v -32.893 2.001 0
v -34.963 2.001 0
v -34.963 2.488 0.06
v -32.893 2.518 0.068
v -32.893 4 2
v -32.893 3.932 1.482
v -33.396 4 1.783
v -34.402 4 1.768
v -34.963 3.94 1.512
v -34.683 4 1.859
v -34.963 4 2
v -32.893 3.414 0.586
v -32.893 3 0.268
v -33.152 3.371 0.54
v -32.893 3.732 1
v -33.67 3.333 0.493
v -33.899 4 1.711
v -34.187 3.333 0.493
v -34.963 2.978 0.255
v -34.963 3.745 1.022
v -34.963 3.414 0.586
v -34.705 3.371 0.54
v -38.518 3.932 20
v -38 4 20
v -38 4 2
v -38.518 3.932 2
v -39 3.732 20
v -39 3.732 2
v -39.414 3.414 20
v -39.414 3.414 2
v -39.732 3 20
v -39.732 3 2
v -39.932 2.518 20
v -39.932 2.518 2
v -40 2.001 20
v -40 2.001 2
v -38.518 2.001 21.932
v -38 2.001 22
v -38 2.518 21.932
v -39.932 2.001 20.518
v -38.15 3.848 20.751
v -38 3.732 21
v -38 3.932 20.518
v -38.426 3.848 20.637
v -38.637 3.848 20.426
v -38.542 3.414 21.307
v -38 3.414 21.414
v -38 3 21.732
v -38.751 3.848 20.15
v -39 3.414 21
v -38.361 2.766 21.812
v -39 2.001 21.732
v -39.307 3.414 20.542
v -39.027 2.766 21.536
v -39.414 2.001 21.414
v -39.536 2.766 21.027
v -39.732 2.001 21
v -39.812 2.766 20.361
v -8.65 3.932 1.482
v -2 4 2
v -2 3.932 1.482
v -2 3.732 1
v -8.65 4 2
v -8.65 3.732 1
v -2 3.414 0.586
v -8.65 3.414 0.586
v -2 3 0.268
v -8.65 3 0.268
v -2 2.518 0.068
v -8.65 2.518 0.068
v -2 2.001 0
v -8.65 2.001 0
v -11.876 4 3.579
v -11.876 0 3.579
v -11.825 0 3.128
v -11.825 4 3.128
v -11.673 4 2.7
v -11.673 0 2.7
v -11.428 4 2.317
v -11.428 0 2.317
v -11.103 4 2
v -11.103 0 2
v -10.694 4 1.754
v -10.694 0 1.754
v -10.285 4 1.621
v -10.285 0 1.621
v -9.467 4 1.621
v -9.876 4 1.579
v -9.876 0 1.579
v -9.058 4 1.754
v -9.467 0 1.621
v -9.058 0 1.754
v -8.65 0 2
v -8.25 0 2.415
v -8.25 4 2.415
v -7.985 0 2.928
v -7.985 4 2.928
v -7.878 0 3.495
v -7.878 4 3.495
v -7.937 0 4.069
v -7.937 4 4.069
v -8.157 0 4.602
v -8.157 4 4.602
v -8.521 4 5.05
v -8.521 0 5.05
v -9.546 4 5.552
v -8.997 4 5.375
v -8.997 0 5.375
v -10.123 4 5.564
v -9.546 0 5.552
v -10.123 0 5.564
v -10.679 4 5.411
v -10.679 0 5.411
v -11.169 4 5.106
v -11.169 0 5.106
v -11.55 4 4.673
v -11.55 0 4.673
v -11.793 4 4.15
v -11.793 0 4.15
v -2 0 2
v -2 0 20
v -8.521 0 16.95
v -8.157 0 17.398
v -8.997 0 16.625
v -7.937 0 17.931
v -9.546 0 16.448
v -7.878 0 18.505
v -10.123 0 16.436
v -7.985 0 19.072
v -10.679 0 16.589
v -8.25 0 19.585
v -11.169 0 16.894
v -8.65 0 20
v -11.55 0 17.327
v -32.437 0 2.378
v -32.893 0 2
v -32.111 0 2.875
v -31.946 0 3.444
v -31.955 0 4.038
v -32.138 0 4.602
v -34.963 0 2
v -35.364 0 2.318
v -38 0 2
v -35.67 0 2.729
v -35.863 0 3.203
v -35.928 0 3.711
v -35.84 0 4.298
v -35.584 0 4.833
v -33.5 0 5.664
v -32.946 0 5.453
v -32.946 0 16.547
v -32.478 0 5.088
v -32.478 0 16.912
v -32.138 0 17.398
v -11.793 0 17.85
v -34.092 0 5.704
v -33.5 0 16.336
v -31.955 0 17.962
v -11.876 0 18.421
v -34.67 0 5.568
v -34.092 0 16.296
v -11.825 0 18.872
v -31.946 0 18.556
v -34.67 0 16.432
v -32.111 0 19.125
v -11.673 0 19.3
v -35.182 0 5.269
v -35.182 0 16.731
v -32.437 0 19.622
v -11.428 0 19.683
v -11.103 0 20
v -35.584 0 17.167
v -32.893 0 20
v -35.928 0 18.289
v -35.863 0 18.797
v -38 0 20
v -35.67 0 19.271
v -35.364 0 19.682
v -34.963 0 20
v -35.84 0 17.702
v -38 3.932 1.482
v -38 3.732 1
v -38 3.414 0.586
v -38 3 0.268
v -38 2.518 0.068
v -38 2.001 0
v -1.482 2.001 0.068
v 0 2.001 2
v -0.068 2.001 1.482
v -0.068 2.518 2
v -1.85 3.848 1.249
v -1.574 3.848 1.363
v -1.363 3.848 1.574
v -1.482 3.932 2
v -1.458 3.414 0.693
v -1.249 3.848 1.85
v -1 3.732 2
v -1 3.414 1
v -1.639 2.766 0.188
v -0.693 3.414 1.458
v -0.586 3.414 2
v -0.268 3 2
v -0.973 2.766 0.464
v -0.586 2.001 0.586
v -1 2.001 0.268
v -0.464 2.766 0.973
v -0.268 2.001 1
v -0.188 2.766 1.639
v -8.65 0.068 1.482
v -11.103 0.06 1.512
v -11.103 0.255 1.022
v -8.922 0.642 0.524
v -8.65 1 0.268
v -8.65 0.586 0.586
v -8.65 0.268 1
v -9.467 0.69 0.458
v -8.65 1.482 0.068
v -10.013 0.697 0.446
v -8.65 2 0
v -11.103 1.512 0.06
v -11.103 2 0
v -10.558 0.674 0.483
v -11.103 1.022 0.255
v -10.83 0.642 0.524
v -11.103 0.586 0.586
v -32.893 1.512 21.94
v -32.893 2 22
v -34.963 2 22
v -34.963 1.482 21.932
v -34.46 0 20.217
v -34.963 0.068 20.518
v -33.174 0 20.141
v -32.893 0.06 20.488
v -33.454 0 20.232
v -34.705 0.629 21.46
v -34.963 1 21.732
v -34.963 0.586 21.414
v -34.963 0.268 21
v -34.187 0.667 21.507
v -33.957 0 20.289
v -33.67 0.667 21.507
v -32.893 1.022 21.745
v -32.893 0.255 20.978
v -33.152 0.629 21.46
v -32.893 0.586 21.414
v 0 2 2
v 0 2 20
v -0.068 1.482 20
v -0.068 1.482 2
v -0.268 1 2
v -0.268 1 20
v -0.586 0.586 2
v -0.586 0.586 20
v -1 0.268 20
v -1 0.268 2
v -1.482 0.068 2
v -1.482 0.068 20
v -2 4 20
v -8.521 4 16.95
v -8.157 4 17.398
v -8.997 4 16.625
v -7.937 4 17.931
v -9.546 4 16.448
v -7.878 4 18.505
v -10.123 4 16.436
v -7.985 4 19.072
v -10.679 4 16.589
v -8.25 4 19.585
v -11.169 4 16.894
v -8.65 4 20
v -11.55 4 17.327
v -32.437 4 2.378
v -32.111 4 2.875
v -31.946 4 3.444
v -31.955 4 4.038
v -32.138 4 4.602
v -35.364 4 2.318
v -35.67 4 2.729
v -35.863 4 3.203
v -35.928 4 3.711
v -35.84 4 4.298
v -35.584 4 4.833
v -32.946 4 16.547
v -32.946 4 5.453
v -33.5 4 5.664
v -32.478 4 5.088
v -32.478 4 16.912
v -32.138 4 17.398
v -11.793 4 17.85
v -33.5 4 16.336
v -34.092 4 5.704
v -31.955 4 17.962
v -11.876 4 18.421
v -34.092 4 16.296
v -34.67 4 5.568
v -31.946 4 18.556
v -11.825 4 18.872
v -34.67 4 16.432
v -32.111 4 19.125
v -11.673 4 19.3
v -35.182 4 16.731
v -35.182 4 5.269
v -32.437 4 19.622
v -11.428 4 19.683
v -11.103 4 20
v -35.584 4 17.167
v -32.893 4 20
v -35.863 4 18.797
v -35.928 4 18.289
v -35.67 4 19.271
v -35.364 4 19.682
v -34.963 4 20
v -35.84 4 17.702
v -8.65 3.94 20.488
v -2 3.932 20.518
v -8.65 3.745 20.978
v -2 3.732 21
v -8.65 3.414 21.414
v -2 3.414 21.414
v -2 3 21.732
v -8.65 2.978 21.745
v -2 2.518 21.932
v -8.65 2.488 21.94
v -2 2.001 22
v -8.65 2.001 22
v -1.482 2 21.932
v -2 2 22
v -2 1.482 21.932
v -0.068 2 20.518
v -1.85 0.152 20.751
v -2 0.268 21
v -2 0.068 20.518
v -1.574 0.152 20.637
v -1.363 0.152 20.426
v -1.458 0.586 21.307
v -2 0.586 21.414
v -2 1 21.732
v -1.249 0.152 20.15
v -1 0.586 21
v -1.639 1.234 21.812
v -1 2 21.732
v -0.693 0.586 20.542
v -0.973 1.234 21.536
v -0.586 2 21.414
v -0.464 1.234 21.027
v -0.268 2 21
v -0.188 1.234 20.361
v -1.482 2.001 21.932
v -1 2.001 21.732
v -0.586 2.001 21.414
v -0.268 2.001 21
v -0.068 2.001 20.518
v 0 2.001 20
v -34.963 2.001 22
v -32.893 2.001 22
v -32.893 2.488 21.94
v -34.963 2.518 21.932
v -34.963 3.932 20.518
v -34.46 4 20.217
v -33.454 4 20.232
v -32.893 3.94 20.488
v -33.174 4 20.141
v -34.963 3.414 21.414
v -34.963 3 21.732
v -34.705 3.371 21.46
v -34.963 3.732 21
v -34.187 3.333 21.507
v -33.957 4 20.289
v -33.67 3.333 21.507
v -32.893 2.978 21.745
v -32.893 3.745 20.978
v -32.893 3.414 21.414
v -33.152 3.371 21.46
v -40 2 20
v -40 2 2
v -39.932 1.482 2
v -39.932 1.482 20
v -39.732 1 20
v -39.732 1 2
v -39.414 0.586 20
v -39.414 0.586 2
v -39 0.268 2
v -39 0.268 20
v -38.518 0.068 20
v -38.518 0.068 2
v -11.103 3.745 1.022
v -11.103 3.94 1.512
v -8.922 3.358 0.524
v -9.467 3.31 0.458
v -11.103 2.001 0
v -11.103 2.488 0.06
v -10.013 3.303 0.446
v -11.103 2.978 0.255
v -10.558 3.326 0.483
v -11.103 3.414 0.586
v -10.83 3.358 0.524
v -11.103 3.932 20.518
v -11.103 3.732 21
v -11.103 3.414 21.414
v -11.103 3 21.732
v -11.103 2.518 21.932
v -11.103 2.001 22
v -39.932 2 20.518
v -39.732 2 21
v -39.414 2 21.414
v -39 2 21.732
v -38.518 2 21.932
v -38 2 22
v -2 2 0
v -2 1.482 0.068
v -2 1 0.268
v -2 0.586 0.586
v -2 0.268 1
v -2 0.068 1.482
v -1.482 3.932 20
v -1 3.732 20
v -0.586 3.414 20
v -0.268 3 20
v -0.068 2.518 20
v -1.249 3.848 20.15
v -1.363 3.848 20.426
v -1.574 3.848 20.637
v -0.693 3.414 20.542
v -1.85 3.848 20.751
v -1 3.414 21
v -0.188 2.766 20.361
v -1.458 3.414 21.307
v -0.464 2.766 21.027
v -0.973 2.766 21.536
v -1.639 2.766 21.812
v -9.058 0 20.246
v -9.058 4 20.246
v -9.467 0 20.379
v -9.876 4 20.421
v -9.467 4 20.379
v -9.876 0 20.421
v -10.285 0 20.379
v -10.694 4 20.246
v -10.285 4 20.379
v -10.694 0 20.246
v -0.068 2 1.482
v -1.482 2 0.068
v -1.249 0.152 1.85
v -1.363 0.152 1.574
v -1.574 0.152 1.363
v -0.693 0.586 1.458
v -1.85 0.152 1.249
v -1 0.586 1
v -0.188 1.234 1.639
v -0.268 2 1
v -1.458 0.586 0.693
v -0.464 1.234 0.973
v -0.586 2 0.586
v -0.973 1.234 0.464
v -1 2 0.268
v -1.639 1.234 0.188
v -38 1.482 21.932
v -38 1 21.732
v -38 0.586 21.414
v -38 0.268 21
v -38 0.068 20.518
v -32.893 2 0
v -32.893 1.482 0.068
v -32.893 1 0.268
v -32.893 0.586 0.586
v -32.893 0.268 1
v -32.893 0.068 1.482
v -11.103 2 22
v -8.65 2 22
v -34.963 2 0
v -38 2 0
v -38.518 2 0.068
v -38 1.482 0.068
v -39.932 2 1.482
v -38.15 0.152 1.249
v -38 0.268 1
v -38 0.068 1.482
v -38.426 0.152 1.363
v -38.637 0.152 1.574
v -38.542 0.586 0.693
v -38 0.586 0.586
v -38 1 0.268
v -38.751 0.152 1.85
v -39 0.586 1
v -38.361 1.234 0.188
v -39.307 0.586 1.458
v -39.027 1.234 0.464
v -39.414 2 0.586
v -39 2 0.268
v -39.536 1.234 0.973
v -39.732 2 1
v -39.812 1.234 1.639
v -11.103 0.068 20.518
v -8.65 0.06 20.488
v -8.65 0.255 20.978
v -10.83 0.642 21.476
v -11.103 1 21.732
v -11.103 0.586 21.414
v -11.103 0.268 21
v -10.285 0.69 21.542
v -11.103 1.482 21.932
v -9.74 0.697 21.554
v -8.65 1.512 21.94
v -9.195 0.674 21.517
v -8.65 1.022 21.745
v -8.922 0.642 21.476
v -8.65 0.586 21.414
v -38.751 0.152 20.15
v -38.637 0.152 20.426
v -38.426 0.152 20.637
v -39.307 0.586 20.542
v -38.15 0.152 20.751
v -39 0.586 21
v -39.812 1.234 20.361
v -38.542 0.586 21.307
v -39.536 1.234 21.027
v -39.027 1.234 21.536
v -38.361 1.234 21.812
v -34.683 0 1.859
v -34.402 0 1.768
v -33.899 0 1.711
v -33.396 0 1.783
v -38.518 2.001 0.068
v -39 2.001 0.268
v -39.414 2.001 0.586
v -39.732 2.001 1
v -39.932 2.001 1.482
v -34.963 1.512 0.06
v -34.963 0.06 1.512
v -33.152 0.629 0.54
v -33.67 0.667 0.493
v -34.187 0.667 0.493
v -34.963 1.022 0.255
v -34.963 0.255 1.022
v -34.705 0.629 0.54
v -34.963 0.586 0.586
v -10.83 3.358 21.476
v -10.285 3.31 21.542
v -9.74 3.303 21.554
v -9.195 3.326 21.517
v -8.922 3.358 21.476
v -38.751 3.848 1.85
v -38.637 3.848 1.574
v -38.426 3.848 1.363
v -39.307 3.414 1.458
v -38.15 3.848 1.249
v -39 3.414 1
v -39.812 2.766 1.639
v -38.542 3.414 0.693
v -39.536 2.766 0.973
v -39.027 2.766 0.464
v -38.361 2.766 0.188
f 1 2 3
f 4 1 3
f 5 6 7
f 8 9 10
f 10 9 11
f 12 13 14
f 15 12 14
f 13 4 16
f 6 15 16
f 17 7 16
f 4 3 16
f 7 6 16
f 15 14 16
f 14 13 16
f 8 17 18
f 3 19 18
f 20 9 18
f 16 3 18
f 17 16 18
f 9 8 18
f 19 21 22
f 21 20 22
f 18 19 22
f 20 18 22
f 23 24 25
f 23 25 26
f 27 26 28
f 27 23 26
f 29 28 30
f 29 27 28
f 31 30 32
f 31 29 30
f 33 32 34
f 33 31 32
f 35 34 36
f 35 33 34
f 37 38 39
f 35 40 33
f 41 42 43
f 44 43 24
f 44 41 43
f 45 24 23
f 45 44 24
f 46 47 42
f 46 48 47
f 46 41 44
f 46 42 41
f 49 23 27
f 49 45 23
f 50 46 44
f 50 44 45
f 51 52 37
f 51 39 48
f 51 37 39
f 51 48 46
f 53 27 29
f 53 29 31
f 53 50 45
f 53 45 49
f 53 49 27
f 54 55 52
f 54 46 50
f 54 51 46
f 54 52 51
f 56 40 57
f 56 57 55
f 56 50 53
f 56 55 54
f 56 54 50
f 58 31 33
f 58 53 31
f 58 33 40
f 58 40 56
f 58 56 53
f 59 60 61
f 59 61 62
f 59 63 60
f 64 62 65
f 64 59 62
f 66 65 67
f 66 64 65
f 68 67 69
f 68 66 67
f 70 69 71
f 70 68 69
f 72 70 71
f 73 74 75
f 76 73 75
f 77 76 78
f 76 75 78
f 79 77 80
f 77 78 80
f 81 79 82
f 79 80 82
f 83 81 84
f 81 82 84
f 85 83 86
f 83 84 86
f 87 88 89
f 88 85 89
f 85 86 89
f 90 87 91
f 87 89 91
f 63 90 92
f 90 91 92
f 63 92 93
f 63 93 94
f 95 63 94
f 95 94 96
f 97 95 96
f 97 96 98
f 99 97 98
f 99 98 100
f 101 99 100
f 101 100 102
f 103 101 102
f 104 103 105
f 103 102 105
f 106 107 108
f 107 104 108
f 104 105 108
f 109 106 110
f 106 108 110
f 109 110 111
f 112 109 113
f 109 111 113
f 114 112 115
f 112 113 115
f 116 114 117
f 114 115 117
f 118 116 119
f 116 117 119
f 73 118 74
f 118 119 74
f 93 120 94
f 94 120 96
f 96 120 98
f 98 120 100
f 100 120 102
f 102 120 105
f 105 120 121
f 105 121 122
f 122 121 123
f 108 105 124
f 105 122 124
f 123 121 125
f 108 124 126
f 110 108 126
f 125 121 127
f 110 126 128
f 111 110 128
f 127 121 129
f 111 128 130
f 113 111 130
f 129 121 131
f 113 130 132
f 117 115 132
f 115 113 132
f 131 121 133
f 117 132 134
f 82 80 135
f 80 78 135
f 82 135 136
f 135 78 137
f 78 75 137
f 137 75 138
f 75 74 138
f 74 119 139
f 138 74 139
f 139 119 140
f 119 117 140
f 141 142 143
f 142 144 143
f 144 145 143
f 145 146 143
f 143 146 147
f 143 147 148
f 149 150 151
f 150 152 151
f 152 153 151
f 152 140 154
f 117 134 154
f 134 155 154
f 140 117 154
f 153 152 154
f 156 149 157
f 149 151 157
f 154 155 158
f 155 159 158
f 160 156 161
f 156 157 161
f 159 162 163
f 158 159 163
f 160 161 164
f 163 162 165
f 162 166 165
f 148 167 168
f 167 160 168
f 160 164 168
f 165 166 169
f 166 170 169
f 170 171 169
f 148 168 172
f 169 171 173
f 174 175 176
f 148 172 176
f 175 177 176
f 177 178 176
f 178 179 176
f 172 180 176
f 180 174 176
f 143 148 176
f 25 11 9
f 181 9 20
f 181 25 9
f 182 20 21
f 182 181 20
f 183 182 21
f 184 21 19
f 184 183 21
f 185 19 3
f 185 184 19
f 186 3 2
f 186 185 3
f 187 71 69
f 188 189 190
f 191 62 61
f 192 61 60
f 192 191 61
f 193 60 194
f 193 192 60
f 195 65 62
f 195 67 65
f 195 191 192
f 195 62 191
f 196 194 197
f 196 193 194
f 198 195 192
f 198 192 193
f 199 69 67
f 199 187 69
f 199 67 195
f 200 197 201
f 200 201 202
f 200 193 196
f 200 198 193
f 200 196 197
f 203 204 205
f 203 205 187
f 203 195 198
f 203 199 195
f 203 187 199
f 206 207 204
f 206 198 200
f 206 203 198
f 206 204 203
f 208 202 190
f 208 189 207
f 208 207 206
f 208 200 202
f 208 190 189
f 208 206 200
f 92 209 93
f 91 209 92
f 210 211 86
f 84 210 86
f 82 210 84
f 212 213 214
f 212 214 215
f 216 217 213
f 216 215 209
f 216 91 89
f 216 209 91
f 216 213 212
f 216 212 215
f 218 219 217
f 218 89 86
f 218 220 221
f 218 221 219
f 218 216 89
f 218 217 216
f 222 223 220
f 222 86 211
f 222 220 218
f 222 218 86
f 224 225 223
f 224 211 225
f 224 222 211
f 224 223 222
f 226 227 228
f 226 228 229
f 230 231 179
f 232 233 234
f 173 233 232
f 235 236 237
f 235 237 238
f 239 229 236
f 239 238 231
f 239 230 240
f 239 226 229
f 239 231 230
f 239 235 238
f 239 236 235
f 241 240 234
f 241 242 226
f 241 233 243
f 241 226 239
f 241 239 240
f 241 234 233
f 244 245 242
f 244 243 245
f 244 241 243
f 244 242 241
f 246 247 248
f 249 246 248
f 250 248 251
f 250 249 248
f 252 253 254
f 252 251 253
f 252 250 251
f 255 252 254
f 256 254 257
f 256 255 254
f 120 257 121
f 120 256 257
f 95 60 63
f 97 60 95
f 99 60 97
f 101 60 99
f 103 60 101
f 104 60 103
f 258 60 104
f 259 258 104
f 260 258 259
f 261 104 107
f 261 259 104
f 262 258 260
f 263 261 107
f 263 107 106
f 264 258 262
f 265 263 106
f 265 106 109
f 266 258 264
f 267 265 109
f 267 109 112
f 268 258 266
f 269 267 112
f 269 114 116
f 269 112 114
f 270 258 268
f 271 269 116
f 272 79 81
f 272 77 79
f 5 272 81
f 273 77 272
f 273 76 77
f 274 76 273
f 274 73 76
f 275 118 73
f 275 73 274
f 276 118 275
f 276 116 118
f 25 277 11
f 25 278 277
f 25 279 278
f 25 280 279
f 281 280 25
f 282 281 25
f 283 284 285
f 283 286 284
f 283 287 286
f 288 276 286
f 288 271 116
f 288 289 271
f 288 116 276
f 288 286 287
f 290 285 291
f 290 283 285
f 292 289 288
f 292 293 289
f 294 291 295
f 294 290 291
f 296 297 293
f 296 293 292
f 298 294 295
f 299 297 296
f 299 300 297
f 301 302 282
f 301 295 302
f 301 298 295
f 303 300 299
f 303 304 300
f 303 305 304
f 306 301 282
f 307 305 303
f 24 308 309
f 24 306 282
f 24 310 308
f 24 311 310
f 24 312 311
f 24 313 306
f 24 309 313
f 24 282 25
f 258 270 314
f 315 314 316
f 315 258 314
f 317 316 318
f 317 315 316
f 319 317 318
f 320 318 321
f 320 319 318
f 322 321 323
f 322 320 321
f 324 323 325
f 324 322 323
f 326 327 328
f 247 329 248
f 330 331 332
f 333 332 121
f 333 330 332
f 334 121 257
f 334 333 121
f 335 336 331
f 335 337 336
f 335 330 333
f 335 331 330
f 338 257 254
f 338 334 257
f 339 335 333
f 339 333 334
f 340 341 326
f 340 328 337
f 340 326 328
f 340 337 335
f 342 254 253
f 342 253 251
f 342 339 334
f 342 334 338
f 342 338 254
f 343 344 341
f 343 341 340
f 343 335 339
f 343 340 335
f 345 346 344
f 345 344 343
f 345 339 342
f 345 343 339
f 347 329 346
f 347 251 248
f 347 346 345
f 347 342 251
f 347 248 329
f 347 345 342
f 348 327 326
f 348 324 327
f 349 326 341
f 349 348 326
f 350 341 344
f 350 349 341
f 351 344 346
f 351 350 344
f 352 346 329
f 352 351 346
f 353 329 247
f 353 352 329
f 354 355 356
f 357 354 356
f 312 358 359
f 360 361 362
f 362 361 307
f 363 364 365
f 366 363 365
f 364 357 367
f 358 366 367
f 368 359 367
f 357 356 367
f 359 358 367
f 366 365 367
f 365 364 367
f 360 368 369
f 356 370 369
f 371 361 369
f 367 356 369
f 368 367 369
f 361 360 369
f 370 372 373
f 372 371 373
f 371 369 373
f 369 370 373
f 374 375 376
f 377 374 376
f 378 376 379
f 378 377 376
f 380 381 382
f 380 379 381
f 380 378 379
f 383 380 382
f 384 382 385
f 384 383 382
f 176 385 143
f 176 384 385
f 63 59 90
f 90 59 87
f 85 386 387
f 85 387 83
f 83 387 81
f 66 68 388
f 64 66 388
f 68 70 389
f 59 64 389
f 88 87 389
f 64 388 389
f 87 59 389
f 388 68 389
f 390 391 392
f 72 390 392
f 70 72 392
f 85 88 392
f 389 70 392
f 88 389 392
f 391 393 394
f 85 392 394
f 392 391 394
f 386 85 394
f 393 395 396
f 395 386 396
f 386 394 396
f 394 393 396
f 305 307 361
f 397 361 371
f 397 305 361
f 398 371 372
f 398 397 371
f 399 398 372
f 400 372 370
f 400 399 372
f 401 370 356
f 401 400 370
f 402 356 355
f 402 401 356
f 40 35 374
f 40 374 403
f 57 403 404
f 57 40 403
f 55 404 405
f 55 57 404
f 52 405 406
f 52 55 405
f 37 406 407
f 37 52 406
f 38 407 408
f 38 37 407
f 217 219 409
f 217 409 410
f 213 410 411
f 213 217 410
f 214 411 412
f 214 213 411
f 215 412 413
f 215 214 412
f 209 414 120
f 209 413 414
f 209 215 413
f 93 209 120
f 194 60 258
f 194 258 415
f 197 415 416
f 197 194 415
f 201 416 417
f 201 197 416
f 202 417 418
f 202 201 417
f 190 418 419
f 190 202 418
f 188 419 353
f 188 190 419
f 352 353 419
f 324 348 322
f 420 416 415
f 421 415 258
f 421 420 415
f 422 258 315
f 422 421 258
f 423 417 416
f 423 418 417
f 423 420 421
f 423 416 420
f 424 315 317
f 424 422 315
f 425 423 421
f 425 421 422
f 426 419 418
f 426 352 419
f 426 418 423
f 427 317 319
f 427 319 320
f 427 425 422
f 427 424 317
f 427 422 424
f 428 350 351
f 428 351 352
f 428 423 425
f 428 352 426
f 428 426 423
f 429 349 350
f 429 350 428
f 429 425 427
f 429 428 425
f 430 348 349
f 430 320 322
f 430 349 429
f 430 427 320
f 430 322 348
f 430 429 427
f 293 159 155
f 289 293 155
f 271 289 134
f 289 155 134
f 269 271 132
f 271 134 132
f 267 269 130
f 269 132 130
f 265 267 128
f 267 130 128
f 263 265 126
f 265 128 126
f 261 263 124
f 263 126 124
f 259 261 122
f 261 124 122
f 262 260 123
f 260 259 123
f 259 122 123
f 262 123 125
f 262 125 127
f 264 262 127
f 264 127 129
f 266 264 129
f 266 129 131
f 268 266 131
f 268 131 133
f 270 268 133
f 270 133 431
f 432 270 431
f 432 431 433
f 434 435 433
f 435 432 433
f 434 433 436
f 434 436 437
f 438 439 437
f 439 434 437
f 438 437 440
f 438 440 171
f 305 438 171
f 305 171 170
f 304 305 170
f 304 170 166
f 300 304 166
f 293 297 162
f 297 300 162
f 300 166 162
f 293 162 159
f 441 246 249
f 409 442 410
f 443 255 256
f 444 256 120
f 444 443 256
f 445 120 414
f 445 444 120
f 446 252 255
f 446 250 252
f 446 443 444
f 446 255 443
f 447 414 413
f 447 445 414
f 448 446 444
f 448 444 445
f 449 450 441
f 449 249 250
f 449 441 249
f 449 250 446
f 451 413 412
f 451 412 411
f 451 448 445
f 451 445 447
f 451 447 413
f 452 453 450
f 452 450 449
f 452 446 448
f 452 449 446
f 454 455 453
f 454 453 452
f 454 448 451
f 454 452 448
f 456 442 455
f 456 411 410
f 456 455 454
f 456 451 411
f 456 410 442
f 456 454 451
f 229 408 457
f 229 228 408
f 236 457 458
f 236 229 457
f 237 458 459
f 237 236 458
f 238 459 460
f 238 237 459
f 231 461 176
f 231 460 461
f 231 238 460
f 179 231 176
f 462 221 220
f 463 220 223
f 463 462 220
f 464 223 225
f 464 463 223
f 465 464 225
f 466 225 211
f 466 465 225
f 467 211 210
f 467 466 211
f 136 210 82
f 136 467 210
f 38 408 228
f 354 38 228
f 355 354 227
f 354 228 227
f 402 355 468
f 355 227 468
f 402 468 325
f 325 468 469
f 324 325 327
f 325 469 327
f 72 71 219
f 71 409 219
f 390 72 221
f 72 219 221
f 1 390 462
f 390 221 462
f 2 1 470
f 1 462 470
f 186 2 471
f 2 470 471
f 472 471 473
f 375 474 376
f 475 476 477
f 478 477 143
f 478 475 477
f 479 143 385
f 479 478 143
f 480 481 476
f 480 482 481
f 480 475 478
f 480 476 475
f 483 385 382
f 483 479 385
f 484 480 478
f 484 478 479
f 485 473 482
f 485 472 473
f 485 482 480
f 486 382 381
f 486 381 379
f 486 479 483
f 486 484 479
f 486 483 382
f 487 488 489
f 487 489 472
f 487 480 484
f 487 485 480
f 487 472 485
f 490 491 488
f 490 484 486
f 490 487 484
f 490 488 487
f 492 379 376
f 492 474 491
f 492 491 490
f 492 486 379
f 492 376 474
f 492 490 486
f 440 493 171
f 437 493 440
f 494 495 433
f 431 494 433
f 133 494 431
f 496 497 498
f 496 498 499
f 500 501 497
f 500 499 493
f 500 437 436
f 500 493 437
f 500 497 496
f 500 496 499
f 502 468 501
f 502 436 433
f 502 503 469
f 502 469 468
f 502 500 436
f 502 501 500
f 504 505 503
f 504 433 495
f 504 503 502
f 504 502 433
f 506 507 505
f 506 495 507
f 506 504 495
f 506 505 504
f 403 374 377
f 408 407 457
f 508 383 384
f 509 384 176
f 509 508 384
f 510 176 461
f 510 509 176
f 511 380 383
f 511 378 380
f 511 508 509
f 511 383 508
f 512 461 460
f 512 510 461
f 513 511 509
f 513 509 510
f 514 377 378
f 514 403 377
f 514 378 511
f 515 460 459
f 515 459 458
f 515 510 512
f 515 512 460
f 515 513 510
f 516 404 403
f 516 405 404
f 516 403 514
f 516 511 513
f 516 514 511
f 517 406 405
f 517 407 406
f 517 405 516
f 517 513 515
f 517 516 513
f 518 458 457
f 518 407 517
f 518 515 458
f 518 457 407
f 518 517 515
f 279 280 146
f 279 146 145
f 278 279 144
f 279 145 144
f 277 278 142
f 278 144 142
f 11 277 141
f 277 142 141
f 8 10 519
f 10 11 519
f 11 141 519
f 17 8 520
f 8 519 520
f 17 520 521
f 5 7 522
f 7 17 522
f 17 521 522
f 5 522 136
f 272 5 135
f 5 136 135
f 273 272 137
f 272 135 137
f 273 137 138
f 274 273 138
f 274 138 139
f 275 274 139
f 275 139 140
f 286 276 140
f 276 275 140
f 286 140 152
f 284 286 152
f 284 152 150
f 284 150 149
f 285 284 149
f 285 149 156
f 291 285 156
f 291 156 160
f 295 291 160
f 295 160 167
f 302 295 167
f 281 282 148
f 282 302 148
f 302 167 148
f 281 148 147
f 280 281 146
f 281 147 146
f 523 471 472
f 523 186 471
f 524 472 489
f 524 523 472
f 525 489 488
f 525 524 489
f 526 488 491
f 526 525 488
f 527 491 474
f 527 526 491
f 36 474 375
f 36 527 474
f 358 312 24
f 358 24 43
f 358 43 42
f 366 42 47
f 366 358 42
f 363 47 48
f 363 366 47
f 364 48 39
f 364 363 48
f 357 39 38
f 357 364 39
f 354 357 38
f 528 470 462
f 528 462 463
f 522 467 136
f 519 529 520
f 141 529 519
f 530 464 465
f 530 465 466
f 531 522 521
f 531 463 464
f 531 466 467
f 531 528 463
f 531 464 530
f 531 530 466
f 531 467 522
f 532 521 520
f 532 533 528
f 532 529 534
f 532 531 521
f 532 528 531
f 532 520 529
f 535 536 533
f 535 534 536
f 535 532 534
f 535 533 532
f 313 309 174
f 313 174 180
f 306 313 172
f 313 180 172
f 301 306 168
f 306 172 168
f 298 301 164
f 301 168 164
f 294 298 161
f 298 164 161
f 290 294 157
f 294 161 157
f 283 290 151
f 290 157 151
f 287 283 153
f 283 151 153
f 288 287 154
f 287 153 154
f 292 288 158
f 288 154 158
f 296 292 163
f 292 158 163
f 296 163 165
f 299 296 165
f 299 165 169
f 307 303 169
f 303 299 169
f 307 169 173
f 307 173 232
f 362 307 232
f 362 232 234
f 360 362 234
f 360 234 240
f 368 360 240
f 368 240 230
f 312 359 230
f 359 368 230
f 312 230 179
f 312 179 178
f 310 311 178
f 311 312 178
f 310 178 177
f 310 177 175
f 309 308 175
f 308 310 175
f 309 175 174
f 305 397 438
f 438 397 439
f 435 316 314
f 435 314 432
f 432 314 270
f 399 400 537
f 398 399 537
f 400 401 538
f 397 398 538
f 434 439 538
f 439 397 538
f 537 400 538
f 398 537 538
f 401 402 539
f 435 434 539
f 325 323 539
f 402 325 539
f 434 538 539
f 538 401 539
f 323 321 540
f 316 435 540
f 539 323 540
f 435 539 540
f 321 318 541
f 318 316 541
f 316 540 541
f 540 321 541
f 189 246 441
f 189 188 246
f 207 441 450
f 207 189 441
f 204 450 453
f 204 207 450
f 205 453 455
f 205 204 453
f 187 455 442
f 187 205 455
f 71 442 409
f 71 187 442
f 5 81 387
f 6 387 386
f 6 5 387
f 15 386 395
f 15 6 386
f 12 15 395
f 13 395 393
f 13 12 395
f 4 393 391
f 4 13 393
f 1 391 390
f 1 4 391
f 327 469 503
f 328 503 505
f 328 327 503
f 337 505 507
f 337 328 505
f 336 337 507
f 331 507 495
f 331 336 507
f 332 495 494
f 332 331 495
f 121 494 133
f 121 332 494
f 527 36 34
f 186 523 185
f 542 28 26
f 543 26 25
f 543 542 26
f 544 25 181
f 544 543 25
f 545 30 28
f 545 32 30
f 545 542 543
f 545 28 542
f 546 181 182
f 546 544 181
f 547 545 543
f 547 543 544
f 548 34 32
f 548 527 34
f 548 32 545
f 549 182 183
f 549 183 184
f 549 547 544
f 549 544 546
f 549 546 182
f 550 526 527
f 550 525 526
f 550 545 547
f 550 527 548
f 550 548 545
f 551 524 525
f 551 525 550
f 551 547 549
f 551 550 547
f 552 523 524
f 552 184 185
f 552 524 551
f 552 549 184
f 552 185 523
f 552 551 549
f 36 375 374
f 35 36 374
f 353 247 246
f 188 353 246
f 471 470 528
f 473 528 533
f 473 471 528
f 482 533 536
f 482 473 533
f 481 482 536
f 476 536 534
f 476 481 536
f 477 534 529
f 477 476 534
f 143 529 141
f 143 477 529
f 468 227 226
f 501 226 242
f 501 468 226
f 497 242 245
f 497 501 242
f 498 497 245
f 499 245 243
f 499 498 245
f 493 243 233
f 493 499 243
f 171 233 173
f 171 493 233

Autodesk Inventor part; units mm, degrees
ref_plane "YZ Plane" through (0, 0, 0) normal (1, 0, 0) x (0, 1, 0)
ref_plane "XZ Plane" through (0, 0, 0) normal (0, 1, 0) x (-1, 0, 0)
ref_plane "XY Plane" through (0, 0, 0) normal (0, 0, 1) x (1, 0, 0)
sketch "Эскиз1" plane through (0, 0, 0) normal (0, 1, 0) x (-1, 0, 0)
  line L0 (40, 22) -> (0, 22)
  line L1 (0, 22) -> (0, 0)
  line L2 (0, 0) -> (40, 0)
  line L3 (40, 0) -> (40, 22)
  circle A0 centre (33.9283, 18.2892) radius 2
  circle A1 centre (33.9283, 3.7108) radius 2
  circle A2 centre (9.8763, 18.4209) radius 2
  circle A3 centre (9.8763, 3.5791) radius 2
  dimension "d0" = 40
  dimension "d1" = 22
  dimension "d2" = 4
  dimension "d3" = 4
  dimension "d4" = 4
  dimension "d5" = 4
  dimension "d6" = 6.0717
  dimension "d7" = 6.0717
  dimension "d8" = 3.7108
  dimension "d9" = 3.7108
  dimension "d10" = 9.8763
  dimension "d11" = 9.8763
  dimension "d12" = 3.5791
  dimension "d13" = 3.5791
extrude "Выдавливание1" add sketch "Эскиз1" along normal blind 4
fillet "Сопряжение1" radius 2 12 edges at (0, 2, 22) (0, 2, 0) (-40, 2, 0) (-40, 2, 22) (-40, 0, 11) (-40, 4, 11) (-20, 0, 22) (-20, 4, 22) (0, 0, 11) (0, 4, 11) (-20, 0, 0) (-20, 4, 0)
